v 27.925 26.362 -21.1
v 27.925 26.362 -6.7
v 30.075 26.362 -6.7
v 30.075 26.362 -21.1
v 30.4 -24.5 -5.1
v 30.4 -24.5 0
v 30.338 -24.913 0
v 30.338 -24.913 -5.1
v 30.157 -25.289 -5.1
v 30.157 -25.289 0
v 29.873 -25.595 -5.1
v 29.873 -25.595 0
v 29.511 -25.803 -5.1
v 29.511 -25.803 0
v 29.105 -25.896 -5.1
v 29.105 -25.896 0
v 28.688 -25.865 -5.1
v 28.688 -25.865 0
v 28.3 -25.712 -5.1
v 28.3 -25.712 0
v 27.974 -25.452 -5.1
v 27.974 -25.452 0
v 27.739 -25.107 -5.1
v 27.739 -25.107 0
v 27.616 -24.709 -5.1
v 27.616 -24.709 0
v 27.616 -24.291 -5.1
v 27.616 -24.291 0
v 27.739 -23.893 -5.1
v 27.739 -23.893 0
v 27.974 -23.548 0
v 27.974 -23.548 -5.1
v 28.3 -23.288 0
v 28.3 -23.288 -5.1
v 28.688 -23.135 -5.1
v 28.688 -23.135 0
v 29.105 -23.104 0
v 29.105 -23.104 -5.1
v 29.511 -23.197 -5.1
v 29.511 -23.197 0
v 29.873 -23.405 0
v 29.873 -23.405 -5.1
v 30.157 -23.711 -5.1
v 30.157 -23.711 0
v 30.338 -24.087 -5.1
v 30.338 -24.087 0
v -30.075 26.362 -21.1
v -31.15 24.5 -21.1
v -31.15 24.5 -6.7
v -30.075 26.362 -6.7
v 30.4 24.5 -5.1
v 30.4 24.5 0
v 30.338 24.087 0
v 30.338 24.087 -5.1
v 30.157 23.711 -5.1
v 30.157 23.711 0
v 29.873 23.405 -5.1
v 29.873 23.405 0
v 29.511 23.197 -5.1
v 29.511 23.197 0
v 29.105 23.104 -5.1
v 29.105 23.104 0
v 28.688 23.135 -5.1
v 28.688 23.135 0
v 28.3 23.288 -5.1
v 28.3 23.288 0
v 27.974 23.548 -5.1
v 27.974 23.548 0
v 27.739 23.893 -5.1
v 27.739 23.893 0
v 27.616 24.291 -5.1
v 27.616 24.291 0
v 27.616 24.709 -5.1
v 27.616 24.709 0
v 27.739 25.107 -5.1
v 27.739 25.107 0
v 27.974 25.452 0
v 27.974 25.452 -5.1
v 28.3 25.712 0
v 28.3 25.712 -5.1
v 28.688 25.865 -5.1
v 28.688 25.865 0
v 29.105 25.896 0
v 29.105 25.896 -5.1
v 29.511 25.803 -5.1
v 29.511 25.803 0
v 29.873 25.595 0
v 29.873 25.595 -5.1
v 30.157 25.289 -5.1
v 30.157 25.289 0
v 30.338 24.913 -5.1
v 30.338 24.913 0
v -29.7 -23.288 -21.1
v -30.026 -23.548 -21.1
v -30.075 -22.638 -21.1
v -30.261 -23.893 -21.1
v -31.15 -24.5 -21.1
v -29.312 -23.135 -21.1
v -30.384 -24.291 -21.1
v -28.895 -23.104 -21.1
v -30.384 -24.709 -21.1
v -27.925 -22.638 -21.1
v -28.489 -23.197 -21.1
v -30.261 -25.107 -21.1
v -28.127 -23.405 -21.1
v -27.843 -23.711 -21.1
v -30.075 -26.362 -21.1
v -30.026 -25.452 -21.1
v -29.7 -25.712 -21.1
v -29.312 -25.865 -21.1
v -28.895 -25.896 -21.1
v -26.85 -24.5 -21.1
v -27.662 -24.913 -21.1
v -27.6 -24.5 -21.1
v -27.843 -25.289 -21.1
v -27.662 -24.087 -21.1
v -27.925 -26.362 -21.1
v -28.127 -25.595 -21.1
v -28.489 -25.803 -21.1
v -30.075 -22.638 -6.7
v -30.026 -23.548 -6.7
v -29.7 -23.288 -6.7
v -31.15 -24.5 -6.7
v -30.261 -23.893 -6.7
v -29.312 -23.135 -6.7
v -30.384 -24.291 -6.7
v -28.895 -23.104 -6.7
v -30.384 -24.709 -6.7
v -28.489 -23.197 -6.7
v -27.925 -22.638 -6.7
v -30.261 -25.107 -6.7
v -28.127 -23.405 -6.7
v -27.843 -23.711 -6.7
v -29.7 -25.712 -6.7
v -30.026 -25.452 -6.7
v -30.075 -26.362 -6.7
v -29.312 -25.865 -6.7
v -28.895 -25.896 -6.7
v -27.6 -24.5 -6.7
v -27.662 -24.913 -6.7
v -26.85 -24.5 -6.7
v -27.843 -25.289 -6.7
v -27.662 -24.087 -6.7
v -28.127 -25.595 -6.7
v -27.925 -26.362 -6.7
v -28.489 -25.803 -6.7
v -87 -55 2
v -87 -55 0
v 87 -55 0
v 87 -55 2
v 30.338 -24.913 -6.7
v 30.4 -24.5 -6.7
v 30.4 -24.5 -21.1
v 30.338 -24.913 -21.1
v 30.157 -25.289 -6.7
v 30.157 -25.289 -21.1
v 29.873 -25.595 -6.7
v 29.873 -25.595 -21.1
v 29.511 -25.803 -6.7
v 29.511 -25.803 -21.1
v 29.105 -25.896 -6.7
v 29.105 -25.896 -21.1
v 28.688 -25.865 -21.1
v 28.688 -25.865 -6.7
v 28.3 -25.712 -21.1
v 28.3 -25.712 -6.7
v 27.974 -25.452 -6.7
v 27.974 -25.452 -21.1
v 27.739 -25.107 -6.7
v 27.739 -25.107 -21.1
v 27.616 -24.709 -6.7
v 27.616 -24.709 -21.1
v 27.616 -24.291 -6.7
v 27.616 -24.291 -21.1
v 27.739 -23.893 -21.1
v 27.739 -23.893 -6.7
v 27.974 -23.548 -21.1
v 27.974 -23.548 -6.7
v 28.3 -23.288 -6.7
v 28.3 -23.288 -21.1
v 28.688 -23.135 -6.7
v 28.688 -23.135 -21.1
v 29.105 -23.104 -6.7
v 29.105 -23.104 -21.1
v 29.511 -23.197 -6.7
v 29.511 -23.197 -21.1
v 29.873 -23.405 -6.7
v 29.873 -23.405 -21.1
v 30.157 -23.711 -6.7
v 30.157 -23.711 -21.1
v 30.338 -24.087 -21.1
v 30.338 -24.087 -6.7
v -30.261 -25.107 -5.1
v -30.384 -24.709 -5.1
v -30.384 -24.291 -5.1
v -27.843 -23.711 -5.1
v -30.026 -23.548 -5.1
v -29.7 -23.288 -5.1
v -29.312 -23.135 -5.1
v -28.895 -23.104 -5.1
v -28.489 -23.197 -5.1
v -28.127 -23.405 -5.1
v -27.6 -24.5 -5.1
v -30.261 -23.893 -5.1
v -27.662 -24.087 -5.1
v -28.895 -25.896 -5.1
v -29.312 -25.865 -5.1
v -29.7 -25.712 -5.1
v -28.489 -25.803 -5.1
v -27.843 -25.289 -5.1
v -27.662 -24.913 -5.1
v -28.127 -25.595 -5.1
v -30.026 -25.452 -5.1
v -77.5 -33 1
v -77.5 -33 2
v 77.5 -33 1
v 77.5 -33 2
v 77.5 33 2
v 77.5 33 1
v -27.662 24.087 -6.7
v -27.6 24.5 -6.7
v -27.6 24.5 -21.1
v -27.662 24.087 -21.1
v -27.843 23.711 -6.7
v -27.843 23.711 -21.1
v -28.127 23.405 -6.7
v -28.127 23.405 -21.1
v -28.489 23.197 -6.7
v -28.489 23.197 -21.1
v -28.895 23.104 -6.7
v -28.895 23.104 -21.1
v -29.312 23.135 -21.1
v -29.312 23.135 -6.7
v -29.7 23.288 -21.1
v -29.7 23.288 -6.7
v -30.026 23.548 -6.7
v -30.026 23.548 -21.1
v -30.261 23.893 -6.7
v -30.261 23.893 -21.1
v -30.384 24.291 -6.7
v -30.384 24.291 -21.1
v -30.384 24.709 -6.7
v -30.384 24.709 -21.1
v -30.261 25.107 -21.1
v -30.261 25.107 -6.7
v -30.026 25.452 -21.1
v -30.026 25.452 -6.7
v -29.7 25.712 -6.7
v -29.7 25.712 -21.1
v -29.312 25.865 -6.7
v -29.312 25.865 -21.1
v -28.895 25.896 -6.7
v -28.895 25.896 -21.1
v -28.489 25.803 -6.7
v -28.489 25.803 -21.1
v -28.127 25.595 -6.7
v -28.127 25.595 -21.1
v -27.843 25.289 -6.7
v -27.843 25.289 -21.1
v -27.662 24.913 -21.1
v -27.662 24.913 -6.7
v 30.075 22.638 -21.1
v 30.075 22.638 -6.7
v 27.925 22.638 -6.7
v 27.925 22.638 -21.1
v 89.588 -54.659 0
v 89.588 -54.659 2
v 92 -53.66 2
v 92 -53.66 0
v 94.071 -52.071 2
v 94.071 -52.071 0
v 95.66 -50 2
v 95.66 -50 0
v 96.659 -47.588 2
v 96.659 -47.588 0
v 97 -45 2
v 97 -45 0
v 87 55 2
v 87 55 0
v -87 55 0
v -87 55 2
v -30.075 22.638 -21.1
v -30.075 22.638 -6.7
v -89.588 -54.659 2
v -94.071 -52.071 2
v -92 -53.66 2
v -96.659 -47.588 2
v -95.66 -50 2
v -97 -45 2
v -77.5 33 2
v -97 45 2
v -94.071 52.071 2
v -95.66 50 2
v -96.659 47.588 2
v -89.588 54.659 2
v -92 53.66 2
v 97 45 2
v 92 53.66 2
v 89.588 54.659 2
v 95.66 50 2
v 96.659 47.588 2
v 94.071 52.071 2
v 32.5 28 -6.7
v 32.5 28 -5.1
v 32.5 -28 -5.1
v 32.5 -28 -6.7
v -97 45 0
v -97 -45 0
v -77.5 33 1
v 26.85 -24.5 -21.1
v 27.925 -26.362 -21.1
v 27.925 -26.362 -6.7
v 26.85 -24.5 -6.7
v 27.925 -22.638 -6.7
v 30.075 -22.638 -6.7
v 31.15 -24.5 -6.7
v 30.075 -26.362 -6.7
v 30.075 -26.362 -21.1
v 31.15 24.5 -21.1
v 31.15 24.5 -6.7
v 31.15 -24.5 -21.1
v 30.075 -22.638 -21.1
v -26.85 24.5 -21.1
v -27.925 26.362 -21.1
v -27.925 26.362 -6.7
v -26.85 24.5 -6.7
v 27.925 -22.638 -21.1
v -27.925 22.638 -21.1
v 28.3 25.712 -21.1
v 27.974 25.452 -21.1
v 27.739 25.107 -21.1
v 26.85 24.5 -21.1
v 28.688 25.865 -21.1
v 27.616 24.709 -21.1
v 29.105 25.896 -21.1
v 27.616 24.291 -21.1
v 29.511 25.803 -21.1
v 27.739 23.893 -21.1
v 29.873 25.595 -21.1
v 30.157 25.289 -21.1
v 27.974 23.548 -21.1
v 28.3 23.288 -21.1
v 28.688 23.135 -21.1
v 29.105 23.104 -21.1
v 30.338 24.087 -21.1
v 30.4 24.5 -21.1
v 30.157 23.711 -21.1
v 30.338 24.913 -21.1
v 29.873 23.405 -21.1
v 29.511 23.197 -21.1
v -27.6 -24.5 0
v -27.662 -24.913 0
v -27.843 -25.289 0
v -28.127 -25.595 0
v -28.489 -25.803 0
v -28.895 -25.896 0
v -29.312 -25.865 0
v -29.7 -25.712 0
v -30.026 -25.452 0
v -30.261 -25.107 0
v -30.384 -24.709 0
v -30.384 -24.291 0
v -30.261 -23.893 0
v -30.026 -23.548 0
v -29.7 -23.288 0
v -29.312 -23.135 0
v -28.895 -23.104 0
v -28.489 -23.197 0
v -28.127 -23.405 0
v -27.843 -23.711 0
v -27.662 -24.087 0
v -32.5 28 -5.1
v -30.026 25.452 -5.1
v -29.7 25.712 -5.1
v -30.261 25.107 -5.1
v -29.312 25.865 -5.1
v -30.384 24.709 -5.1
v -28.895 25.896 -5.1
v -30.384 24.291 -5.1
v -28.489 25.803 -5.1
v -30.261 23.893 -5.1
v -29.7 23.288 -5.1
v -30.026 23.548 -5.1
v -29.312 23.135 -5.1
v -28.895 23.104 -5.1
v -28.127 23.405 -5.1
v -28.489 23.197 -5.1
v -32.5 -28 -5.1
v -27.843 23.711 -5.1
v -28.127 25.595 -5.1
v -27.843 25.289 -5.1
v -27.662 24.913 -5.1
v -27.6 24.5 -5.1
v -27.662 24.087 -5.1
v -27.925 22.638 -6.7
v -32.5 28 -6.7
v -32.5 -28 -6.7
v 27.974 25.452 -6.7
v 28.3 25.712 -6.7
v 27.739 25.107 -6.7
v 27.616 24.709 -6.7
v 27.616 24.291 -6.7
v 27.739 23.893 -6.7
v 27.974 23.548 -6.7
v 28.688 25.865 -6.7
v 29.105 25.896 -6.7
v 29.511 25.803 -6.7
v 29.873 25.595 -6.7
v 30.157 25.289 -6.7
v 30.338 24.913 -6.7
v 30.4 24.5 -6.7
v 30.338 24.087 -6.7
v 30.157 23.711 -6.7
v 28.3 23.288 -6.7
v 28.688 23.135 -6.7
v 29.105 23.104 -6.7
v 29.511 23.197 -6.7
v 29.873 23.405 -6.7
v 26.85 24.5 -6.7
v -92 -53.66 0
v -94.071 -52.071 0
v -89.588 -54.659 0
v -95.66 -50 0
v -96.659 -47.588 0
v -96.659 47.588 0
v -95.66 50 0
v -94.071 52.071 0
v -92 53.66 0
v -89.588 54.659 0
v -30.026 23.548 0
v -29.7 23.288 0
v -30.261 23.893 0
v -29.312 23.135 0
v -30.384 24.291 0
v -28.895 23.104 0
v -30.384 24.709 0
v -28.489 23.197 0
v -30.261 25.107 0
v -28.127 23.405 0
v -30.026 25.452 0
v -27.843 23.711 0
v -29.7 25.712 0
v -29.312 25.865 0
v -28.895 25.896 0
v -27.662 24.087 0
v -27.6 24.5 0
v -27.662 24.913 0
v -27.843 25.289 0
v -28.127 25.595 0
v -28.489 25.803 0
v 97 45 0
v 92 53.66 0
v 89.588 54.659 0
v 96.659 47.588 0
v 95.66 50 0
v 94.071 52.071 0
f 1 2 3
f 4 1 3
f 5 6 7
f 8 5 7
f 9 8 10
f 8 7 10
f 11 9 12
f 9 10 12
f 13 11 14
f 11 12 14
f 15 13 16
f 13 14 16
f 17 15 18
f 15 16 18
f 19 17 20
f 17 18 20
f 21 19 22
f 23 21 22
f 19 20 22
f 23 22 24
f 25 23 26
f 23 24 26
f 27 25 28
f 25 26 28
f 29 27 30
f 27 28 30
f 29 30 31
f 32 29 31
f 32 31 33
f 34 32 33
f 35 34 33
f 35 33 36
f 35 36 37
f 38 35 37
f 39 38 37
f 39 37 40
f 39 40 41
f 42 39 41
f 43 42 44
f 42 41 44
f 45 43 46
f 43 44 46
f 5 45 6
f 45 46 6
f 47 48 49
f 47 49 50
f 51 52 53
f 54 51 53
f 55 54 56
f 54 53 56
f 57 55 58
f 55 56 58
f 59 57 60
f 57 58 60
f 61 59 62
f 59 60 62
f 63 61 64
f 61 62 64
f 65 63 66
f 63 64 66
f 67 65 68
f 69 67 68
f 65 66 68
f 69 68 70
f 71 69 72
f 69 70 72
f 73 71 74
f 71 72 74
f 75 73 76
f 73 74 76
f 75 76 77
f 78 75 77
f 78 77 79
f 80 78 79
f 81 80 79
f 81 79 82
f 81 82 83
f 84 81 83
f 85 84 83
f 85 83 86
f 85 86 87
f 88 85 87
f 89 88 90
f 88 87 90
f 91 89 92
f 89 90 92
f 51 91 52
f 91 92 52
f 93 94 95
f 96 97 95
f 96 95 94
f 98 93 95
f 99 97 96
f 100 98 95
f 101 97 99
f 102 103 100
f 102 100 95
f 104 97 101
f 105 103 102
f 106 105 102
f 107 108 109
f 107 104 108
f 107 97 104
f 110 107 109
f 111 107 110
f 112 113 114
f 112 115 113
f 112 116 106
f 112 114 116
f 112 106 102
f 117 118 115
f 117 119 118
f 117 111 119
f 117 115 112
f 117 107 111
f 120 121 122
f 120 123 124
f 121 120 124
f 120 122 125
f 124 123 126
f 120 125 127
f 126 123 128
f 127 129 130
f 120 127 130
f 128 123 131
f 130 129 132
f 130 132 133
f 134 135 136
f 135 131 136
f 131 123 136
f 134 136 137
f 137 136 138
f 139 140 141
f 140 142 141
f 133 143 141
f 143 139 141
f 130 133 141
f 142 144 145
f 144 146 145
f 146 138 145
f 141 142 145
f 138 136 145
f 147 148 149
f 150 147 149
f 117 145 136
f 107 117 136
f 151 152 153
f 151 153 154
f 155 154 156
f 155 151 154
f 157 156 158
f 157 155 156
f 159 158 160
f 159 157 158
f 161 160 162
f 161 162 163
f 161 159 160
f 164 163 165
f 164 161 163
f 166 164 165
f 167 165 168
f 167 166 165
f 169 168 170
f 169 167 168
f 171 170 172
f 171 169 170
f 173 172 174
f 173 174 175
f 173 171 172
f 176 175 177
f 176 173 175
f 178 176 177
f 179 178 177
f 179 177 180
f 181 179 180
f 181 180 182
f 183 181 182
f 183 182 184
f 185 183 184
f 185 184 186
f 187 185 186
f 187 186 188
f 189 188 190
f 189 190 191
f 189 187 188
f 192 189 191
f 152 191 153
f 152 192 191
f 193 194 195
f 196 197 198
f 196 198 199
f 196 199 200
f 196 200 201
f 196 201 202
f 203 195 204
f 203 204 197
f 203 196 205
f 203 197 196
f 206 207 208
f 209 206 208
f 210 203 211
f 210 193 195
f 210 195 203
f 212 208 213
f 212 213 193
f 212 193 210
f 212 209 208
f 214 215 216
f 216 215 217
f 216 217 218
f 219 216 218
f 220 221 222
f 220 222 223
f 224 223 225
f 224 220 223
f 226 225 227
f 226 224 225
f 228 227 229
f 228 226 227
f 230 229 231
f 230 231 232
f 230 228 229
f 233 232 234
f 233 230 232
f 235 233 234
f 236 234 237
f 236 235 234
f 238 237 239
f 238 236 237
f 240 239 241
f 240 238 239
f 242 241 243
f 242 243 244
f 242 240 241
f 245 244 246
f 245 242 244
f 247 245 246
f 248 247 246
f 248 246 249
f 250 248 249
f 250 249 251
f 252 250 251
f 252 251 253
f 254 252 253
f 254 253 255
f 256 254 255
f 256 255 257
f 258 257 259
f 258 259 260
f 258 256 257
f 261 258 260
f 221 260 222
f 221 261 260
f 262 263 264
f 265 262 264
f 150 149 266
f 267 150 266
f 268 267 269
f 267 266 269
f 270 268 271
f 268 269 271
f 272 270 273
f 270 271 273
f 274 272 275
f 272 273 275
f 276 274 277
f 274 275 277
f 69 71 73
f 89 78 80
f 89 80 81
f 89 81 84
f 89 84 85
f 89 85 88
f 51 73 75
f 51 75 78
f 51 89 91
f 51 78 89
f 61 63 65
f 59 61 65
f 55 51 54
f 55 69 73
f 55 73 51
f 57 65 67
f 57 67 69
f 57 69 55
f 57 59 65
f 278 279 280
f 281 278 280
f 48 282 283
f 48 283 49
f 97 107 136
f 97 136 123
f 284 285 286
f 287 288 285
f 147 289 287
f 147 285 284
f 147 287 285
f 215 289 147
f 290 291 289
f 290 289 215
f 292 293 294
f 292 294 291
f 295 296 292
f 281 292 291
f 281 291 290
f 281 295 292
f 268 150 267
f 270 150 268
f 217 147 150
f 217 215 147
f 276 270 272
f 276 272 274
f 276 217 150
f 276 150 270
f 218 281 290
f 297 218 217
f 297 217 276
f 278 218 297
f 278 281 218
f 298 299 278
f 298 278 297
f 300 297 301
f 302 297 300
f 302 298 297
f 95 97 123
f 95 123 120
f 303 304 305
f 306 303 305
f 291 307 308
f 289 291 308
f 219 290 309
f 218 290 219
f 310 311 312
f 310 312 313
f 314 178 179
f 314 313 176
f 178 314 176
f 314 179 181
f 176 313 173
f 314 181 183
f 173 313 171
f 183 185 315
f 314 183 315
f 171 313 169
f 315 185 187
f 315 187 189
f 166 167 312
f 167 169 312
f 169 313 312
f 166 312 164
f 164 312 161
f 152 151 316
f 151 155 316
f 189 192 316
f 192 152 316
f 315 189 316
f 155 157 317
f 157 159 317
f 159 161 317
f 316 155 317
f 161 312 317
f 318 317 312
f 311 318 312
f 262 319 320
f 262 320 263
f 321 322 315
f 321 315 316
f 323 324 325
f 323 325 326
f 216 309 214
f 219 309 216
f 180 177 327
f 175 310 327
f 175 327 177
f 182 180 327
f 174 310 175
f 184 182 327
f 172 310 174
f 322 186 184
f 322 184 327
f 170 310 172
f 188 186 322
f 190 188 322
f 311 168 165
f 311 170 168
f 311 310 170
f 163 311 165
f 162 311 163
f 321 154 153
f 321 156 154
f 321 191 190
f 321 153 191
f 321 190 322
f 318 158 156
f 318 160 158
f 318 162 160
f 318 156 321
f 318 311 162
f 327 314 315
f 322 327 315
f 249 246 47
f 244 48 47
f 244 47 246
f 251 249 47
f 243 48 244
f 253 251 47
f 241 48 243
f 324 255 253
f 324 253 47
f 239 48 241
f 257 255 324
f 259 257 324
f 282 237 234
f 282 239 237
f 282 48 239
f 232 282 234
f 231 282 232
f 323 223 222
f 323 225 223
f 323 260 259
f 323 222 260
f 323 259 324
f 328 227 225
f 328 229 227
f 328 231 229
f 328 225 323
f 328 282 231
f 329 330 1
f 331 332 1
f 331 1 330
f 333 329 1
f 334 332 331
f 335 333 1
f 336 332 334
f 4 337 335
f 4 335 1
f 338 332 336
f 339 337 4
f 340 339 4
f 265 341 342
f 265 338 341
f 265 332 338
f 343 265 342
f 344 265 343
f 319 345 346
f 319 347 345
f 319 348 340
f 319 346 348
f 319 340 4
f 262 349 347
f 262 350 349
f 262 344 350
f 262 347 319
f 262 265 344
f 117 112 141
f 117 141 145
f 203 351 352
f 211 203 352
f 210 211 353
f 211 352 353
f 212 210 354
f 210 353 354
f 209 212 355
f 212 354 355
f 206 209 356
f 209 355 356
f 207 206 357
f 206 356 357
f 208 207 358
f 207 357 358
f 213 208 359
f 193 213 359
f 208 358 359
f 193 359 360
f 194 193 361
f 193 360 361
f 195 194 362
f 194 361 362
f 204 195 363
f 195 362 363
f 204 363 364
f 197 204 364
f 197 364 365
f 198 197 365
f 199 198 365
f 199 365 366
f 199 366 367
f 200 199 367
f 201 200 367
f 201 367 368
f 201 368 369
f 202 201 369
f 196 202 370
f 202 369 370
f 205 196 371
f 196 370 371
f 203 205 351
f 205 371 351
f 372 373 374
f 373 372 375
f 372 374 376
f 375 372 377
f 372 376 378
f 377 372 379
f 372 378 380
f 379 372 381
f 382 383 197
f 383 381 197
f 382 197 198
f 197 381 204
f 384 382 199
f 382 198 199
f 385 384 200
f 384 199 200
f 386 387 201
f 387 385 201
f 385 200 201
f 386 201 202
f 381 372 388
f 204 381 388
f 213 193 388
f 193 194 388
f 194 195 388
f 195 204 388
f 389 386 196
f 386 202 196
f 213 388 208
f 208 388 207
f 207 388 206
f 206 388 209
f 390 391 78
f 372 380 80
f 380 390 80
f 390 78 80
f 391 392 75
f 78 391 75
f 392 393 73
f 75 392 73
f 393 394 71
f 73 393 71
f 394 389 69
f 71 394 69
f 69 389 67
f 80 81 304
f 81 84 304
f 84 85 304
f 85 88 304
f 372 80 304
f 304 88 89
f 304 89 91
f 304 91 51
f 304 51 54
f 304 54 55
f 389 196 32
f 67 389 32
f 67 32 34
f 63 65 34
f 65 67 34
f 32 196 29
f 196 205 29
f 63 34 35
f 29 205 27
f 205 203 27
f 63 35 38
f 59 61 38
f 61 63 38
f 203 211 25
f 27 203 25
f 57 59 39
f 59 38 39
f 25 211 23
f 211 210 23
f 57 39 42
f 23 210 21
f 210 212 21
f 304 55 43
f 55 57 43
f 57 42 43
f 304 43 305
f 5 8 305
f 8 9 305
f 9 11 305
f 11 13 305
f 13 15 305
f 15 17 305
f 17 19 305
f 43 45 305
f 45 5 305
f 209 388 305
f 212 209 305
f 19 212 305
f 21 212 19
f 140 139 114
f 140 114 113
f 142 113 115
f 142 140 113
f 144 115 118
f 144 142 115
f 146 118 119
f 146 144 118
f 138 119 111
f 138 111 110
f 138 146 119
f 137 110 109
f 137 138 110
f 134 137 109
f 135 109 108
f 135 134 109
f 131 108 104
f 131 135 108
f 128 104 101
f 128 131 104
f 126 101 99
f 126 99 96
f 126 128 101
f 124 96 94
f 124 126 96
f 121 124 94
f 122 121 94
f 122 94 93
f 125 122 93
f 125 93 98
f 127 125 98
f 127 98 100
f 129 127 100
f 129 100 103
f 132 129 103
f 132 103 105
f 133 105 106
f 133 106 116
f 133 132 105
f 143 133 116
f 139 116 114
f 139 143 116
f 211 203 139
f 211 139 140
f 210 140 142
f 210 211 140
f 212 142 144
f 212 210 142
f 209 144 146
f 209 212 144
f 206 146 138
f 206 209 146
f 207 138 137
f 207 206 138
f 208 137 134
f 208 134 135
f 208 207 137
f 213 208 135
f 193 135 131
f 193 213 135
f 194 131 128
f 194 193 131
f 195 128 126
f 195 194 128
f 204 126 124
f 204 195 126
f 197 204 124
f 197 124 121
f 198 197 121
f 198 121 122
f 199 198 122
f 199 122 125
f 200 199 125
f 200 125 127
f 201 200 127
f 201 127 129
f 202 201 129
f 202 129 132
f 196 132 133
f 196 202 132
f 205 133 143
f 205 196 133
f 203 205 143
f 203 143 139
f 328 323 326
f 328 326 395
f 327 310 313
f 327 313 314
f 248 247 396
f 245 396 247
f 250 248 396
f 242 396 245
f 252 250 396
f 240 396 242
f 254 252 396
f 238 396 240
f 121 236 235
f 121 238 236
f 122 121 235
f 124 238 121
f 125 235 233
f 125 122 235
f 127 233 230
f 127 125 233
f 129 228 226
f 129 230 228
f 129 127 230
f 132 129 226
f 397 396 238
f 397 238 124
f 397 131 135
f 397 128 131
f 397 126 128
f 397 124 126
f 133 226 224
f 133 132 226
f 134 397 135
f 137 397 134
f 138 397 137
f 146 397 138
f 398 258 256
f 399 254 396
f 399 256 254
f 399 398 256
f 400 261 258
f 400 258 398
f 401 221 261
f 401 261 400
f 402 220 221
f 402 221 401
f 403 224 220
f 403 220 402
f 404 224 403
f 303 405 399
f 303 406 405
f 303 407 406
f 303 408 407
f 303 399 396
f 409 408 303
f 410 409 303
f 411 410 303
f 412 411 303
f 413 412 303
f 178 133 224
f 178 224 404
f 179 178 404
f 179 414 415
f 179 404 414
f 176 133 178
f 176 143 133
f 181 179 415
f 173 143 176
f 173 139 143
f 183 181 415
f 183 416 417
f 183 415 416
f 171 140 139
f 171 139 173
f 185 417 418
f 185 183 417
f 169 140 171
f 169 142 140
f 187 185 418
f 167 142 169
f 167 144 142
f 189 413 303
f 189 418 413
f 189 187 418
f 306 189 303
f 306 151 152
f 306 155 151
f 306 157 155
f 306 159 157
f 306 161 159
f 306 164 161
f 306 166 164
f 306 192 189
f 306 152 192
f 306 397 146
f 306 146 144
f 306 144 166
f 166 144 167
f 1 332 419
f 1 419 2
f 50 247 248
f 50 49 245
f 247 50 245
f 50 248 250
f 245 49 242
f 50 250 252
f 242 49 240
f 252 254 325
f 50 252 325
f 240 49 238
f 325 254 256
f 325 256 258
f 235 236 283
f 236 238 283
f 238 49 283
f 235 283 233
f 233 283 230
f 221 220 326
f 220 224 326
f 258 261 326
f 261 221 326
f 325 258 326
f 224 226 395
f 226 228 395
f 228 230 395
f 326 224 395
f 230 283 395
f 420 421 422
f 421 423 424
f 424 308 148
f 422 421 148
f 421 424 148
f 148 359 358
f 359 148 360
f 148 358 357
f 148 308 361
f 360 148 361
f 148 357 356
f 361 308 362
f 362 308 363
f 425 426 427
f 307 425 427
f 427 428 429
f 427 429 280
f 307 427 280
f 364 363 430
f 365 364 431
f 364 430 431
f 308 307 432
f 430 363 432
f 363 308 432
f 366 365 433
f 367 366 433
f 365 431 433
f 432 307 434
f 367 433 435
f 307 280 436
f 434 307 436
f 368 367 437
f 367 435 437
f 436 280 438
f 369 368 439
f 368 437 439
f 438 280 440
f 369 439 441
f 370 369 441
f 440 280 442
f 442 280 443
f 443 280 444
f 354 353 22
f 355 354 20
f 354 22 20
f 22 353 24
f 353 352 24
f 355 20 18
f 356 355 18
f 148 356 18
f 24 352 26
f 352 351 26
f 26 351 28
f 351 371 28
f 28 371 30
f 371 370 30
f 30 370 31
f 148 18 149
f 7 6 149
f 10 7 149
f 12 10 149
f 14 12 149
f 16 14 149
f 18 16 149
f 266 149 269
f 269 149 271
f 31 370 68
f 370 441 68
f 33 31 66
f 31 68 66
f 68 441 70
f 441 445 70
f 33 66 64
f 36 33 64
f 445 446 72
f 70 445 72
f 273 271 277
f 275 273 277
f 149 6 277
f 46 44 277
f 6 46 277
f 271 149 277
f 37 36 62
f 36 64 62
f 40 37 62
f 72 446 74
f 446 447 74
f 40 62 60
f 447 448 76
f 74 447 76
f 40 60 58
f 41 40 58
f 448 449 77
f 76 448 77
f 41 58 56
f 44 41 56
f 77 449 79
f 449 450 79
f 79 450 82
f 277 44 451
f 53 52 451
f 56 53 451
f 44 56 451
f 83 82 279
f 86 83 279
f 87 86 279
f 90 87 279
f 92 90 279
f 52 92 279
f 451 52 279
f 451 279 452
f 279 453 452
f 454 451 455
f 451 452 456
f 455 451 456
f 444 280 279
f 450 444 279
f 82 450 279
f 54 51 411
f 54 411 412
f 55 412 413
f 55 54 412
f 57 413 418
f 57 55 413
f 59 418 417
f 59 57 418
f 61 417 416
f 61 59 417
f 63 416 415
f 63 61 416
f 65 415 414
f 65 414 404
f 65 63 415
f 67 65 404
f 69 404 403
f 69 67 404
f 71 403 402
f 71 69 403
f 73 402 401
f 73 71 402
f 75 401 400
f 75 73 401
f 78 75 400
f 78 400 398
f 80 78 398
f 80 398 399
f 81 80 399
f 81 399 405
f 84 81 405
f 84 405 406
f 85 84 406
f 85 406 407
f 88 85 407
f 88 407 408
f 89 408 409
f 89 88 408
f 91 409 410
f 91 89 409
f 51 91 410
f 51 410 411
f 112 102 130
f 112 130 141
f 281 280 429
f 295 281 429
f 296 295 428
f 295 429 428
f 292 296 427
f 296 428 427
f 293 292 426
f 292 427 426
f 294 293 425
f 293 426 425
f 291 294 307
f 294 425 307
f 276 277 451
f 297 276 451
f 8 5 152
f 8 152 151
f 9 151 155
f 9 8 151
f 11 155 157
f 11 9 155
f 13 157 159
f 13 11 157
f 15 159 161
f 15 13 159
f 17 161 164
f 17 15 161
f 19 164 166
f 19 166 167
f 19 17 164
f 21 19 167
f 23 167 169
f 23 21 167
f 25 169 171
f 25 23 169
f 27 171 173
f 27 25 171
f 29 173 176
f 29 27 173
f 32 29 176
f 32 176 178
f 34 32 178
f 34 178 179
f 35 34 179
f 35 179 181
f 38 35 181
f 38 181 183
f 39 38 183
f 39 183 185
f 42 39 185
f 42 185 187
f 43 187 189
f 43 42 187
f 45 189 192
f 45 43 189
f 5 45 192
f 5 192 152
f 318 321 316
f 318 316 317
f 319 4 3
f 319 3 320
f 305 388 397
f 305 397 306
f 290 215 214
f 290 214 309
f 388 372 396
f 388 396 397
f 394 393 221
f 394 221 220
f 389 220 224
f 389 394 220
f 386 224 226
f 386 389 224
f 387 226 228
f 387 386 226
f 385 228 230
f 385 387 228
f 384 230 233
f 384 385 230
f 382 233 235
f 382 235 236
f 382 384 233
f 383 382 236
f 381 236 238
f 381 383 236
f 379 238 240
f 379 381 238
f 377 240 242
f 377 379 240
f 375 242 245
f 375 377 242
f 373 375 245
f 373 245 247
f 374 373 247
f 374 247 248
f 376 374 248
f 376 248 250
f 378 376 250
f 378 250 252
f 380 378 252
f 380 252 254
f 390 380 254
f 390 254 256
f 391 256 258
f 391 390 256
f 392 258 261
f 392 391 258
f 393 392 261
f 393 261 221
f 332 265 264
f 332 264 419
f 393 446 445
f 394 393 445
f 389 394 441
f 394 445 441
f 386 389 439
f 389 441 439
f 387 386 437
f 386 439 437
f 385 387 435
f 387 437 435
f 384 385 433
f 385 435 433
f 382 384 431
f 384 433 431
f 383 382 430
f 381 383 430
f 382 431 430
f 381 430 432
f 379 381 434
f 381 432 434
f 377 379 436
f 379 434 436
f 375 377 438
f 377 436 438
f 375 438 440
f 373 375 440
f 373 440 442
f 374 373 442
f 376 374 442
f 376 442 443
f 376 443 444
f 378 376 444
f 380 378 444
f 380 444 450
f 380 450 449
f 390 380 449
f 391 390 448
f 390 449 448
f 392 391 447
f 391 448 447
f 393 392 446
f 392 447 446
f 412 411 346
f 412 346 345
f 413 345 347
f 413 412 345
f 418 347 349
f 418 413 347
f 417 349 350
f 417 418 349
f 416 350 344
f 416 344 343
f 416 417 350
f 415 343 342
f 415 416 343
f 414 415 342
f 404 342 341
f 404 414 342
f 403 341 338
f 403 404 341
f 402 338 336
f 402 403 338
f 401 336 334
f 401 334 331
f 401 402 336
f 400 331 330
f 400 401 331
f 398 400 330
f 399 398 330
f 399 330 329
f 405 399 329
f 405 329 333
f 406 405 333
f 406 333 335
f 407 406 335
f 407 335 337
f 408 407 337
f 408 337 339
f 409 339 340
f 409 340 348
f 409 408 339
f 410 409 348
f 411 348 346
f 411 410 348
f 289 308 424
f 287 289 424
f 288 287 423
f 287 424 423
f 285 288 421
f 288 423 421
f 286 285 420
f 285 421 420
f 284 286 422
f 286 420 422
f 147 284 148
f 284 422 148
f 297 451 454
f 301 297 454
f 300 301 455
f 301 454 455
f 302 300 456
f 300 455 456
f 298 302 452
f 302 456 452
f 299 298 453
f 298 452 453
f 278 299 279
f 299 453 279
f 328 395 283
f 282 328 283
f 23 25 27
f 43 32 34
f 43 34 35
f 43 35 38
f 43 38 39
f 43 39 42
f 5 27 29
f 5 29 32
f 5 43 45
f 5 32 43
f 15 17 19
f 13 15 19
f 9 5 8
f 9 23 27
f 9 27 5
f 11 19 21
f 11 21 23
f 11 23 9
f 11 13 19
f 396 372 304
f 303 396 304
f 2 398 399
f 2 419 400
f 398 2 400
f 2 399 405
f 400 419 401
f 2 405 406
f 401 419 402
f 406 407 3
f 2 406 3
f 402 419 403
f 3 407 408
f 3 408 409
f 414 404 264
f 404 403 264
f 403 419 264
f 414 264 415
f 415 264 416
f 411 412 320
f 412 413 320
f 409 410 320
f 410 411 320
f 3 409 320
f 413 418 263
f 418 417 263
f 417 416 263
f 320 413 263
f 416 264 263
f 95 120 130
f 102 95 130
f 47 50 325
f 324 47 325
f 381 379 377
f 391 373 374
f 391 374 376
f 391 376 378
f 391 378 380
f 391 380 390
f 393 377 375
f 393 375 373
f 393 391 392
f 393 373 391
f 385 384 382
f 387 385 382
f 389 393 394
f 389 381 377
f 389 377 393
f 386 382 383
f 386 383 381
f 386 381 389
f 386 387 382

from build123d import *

# Parameters (mm, degrees)
F1_DEPTH = 2
F2_W     = 155
F2_H     = 66
F3_DEPTH = 1
F4_R     = 1.4
F5_DEPTH = 5.1
F6_W     = 65
F6_H     = 56
F6_R     = 1.4
F7_DEPTH = 1.6
F8_R     = 1.4
F9_DEPTH = 14.4


with BuildPart() as f1:
    # F0 (on Top) → F1 (new body)
    with BuildSketch(Plane.XY):
        with BuildLine():
            Line((87, 55), (-87, 55))
            ThreePointArc((-87, 55), (-94.0710678119, 52.0710678119), (-97, 45))
            Line((-97, 45), (-97, -45))
            ThreePointArc((-97, -45), (-94.0710678119, -52.0710678119), (-87, -55))
            Line((-87, -55), (87, -55))
            ThreePointArc((87, -55), (94.0710678119, -52.0710678119), (97, -45))
            Line((97, -45), (97, 45))
            ThreePointArc((97, 45), (94.0710678119, 52.0710678119), (87, 55))
        make_face()
    extrude(amount=F1_DEPTH)

    # F2 (on face) → F3 (cut)
    with BuildSketch(Plane.XY.offset(2)):
        Rectangle(F2_W, F2_H)
    extrude(amount=-F3_DEPTH, mode=Mode.SUBTRACT)

    # F4 (on face) → F5 (join)
    with BuildSketch(Plane(origin=(0, 0, 0), x_dir=(1, 0, 0), z_dir=(0, 0, -1))):
        with Locations((-29, 24.5)):
            Circle(F4_R)
        with Locations((-29, -24.5)):
            Circle(F4_R)
        with Locations((29, -24.5)):
            Circle(F4_R)
        with Locations((29, 24.5)):
            Circle(F4_R)
    extrude(amount=F5_DEPTH)


with BuildPart() as f7:
    # F6 (on face) → F7 (new body)
    with BuildSketch(Plane(origin=(0, 0, -5.1), x_dir=(1, 0, 0), z_dir=(0, 0, -1))):
        Rectangle(F6_W, F6_H)
        with Locations((-29, -24.5)):
            Circle(F6_R, mode=Mode.SUBTRACT)
        with Locations((29, -24.5)):
            Circle(F6_R, mode=Mode.SUBTRACT)
        with Locations((-29, 24.5)):
            Circle(F6_R, mode=Mode.SUBTRACT)
        with Locations((29, 24.5)):
            Circle(F6_R, mode=Mode.SUBTRACT)
    extrude(amount=F7_DEPTH)


with BuildPart() as f9:
    # F8 (on face) → F9 (new body)
    with BuildSketch(Plane(origin=(0, 0, -6.7), x_dir=(1, 0, 0), z_dir=(0, 0, -1))):
        Polygon((-27.925, 22.6380453819), (-26.85, 24.5), (-27.925, 26.3619546181), (-30.075, 26.3619546181), (-31.15, 24.5), (-30.075, 22.6380453819), align=None)
        with Locations((-29, 24.5)):
            Circle(F8_R, mode=Mode.SUBTRACT)
    extrude(amount=F9_DEPTH)


with BuildPart() as f9b:
    # F8 (on face) → F9, piece 2 (new body)
    with BuildSketch(Plane(origin=(0, 0, -6.7), x_dir=(1, 0, 0), z_dir=(0, 0, -1))):
        Polygon((27.925, 26.3619546181), (26.85, 24.5), (27.925, 22.6380453819), (30.075, 22.6380453819), (31.15, 24.5), (30.075, 26.3619546181), align=None)
        with Locations((29, 24.5)):
            Circle(F8_R, mode=Mode.SUBTRACT)
    extrude(amount=F9_DEPTH)


with BuildPart() as f9c:
    # F8 (on face) → F9, piece 3 (new body)
    with BuildSketch(Plane(origin=(0, 0, -6.7), x_dir=(1, 0, 0), z_dir=(0, 0, -1))):
        Polygon((27.925, -22.6380453819), (26.85, -24.5), (27.925, -26.3619546181), (30.075, -26.3619546181), (31.15, -24.5), (30.075, -22.6380453819), align=None)
        with Locations((29, -24.5)):
            Circle(F8_R, mode=Mode.SUBTRACT)
    extrude(amount=F9_DEPTH)


with BuildPart() as f9d:
    # F8 (on face) → F9, piece 4 (new body)
    with BuildSketch(Plane(origin=(0, 0, -6.7), x_dir=(1, 0, 0), z_dir=(0, 0, -1))):
        Polygon((-27.925, -26.3619546181), (-26.85, -24.5), (-27.925, -22.6380453819), (-30.075, -22.6380453819), (-31.15, -24.5), (-30.075, -26.3619546181), align=None)
        with Locations((-29, -24.5)):
            Circle(F8_R, mode=Mode.SUBTRACT)
    extrude(amount=F9_DEPTH)


solid = Compound([f1.part, f7.part, f9.part, f9b.part, f9c.part, f9d.part])
